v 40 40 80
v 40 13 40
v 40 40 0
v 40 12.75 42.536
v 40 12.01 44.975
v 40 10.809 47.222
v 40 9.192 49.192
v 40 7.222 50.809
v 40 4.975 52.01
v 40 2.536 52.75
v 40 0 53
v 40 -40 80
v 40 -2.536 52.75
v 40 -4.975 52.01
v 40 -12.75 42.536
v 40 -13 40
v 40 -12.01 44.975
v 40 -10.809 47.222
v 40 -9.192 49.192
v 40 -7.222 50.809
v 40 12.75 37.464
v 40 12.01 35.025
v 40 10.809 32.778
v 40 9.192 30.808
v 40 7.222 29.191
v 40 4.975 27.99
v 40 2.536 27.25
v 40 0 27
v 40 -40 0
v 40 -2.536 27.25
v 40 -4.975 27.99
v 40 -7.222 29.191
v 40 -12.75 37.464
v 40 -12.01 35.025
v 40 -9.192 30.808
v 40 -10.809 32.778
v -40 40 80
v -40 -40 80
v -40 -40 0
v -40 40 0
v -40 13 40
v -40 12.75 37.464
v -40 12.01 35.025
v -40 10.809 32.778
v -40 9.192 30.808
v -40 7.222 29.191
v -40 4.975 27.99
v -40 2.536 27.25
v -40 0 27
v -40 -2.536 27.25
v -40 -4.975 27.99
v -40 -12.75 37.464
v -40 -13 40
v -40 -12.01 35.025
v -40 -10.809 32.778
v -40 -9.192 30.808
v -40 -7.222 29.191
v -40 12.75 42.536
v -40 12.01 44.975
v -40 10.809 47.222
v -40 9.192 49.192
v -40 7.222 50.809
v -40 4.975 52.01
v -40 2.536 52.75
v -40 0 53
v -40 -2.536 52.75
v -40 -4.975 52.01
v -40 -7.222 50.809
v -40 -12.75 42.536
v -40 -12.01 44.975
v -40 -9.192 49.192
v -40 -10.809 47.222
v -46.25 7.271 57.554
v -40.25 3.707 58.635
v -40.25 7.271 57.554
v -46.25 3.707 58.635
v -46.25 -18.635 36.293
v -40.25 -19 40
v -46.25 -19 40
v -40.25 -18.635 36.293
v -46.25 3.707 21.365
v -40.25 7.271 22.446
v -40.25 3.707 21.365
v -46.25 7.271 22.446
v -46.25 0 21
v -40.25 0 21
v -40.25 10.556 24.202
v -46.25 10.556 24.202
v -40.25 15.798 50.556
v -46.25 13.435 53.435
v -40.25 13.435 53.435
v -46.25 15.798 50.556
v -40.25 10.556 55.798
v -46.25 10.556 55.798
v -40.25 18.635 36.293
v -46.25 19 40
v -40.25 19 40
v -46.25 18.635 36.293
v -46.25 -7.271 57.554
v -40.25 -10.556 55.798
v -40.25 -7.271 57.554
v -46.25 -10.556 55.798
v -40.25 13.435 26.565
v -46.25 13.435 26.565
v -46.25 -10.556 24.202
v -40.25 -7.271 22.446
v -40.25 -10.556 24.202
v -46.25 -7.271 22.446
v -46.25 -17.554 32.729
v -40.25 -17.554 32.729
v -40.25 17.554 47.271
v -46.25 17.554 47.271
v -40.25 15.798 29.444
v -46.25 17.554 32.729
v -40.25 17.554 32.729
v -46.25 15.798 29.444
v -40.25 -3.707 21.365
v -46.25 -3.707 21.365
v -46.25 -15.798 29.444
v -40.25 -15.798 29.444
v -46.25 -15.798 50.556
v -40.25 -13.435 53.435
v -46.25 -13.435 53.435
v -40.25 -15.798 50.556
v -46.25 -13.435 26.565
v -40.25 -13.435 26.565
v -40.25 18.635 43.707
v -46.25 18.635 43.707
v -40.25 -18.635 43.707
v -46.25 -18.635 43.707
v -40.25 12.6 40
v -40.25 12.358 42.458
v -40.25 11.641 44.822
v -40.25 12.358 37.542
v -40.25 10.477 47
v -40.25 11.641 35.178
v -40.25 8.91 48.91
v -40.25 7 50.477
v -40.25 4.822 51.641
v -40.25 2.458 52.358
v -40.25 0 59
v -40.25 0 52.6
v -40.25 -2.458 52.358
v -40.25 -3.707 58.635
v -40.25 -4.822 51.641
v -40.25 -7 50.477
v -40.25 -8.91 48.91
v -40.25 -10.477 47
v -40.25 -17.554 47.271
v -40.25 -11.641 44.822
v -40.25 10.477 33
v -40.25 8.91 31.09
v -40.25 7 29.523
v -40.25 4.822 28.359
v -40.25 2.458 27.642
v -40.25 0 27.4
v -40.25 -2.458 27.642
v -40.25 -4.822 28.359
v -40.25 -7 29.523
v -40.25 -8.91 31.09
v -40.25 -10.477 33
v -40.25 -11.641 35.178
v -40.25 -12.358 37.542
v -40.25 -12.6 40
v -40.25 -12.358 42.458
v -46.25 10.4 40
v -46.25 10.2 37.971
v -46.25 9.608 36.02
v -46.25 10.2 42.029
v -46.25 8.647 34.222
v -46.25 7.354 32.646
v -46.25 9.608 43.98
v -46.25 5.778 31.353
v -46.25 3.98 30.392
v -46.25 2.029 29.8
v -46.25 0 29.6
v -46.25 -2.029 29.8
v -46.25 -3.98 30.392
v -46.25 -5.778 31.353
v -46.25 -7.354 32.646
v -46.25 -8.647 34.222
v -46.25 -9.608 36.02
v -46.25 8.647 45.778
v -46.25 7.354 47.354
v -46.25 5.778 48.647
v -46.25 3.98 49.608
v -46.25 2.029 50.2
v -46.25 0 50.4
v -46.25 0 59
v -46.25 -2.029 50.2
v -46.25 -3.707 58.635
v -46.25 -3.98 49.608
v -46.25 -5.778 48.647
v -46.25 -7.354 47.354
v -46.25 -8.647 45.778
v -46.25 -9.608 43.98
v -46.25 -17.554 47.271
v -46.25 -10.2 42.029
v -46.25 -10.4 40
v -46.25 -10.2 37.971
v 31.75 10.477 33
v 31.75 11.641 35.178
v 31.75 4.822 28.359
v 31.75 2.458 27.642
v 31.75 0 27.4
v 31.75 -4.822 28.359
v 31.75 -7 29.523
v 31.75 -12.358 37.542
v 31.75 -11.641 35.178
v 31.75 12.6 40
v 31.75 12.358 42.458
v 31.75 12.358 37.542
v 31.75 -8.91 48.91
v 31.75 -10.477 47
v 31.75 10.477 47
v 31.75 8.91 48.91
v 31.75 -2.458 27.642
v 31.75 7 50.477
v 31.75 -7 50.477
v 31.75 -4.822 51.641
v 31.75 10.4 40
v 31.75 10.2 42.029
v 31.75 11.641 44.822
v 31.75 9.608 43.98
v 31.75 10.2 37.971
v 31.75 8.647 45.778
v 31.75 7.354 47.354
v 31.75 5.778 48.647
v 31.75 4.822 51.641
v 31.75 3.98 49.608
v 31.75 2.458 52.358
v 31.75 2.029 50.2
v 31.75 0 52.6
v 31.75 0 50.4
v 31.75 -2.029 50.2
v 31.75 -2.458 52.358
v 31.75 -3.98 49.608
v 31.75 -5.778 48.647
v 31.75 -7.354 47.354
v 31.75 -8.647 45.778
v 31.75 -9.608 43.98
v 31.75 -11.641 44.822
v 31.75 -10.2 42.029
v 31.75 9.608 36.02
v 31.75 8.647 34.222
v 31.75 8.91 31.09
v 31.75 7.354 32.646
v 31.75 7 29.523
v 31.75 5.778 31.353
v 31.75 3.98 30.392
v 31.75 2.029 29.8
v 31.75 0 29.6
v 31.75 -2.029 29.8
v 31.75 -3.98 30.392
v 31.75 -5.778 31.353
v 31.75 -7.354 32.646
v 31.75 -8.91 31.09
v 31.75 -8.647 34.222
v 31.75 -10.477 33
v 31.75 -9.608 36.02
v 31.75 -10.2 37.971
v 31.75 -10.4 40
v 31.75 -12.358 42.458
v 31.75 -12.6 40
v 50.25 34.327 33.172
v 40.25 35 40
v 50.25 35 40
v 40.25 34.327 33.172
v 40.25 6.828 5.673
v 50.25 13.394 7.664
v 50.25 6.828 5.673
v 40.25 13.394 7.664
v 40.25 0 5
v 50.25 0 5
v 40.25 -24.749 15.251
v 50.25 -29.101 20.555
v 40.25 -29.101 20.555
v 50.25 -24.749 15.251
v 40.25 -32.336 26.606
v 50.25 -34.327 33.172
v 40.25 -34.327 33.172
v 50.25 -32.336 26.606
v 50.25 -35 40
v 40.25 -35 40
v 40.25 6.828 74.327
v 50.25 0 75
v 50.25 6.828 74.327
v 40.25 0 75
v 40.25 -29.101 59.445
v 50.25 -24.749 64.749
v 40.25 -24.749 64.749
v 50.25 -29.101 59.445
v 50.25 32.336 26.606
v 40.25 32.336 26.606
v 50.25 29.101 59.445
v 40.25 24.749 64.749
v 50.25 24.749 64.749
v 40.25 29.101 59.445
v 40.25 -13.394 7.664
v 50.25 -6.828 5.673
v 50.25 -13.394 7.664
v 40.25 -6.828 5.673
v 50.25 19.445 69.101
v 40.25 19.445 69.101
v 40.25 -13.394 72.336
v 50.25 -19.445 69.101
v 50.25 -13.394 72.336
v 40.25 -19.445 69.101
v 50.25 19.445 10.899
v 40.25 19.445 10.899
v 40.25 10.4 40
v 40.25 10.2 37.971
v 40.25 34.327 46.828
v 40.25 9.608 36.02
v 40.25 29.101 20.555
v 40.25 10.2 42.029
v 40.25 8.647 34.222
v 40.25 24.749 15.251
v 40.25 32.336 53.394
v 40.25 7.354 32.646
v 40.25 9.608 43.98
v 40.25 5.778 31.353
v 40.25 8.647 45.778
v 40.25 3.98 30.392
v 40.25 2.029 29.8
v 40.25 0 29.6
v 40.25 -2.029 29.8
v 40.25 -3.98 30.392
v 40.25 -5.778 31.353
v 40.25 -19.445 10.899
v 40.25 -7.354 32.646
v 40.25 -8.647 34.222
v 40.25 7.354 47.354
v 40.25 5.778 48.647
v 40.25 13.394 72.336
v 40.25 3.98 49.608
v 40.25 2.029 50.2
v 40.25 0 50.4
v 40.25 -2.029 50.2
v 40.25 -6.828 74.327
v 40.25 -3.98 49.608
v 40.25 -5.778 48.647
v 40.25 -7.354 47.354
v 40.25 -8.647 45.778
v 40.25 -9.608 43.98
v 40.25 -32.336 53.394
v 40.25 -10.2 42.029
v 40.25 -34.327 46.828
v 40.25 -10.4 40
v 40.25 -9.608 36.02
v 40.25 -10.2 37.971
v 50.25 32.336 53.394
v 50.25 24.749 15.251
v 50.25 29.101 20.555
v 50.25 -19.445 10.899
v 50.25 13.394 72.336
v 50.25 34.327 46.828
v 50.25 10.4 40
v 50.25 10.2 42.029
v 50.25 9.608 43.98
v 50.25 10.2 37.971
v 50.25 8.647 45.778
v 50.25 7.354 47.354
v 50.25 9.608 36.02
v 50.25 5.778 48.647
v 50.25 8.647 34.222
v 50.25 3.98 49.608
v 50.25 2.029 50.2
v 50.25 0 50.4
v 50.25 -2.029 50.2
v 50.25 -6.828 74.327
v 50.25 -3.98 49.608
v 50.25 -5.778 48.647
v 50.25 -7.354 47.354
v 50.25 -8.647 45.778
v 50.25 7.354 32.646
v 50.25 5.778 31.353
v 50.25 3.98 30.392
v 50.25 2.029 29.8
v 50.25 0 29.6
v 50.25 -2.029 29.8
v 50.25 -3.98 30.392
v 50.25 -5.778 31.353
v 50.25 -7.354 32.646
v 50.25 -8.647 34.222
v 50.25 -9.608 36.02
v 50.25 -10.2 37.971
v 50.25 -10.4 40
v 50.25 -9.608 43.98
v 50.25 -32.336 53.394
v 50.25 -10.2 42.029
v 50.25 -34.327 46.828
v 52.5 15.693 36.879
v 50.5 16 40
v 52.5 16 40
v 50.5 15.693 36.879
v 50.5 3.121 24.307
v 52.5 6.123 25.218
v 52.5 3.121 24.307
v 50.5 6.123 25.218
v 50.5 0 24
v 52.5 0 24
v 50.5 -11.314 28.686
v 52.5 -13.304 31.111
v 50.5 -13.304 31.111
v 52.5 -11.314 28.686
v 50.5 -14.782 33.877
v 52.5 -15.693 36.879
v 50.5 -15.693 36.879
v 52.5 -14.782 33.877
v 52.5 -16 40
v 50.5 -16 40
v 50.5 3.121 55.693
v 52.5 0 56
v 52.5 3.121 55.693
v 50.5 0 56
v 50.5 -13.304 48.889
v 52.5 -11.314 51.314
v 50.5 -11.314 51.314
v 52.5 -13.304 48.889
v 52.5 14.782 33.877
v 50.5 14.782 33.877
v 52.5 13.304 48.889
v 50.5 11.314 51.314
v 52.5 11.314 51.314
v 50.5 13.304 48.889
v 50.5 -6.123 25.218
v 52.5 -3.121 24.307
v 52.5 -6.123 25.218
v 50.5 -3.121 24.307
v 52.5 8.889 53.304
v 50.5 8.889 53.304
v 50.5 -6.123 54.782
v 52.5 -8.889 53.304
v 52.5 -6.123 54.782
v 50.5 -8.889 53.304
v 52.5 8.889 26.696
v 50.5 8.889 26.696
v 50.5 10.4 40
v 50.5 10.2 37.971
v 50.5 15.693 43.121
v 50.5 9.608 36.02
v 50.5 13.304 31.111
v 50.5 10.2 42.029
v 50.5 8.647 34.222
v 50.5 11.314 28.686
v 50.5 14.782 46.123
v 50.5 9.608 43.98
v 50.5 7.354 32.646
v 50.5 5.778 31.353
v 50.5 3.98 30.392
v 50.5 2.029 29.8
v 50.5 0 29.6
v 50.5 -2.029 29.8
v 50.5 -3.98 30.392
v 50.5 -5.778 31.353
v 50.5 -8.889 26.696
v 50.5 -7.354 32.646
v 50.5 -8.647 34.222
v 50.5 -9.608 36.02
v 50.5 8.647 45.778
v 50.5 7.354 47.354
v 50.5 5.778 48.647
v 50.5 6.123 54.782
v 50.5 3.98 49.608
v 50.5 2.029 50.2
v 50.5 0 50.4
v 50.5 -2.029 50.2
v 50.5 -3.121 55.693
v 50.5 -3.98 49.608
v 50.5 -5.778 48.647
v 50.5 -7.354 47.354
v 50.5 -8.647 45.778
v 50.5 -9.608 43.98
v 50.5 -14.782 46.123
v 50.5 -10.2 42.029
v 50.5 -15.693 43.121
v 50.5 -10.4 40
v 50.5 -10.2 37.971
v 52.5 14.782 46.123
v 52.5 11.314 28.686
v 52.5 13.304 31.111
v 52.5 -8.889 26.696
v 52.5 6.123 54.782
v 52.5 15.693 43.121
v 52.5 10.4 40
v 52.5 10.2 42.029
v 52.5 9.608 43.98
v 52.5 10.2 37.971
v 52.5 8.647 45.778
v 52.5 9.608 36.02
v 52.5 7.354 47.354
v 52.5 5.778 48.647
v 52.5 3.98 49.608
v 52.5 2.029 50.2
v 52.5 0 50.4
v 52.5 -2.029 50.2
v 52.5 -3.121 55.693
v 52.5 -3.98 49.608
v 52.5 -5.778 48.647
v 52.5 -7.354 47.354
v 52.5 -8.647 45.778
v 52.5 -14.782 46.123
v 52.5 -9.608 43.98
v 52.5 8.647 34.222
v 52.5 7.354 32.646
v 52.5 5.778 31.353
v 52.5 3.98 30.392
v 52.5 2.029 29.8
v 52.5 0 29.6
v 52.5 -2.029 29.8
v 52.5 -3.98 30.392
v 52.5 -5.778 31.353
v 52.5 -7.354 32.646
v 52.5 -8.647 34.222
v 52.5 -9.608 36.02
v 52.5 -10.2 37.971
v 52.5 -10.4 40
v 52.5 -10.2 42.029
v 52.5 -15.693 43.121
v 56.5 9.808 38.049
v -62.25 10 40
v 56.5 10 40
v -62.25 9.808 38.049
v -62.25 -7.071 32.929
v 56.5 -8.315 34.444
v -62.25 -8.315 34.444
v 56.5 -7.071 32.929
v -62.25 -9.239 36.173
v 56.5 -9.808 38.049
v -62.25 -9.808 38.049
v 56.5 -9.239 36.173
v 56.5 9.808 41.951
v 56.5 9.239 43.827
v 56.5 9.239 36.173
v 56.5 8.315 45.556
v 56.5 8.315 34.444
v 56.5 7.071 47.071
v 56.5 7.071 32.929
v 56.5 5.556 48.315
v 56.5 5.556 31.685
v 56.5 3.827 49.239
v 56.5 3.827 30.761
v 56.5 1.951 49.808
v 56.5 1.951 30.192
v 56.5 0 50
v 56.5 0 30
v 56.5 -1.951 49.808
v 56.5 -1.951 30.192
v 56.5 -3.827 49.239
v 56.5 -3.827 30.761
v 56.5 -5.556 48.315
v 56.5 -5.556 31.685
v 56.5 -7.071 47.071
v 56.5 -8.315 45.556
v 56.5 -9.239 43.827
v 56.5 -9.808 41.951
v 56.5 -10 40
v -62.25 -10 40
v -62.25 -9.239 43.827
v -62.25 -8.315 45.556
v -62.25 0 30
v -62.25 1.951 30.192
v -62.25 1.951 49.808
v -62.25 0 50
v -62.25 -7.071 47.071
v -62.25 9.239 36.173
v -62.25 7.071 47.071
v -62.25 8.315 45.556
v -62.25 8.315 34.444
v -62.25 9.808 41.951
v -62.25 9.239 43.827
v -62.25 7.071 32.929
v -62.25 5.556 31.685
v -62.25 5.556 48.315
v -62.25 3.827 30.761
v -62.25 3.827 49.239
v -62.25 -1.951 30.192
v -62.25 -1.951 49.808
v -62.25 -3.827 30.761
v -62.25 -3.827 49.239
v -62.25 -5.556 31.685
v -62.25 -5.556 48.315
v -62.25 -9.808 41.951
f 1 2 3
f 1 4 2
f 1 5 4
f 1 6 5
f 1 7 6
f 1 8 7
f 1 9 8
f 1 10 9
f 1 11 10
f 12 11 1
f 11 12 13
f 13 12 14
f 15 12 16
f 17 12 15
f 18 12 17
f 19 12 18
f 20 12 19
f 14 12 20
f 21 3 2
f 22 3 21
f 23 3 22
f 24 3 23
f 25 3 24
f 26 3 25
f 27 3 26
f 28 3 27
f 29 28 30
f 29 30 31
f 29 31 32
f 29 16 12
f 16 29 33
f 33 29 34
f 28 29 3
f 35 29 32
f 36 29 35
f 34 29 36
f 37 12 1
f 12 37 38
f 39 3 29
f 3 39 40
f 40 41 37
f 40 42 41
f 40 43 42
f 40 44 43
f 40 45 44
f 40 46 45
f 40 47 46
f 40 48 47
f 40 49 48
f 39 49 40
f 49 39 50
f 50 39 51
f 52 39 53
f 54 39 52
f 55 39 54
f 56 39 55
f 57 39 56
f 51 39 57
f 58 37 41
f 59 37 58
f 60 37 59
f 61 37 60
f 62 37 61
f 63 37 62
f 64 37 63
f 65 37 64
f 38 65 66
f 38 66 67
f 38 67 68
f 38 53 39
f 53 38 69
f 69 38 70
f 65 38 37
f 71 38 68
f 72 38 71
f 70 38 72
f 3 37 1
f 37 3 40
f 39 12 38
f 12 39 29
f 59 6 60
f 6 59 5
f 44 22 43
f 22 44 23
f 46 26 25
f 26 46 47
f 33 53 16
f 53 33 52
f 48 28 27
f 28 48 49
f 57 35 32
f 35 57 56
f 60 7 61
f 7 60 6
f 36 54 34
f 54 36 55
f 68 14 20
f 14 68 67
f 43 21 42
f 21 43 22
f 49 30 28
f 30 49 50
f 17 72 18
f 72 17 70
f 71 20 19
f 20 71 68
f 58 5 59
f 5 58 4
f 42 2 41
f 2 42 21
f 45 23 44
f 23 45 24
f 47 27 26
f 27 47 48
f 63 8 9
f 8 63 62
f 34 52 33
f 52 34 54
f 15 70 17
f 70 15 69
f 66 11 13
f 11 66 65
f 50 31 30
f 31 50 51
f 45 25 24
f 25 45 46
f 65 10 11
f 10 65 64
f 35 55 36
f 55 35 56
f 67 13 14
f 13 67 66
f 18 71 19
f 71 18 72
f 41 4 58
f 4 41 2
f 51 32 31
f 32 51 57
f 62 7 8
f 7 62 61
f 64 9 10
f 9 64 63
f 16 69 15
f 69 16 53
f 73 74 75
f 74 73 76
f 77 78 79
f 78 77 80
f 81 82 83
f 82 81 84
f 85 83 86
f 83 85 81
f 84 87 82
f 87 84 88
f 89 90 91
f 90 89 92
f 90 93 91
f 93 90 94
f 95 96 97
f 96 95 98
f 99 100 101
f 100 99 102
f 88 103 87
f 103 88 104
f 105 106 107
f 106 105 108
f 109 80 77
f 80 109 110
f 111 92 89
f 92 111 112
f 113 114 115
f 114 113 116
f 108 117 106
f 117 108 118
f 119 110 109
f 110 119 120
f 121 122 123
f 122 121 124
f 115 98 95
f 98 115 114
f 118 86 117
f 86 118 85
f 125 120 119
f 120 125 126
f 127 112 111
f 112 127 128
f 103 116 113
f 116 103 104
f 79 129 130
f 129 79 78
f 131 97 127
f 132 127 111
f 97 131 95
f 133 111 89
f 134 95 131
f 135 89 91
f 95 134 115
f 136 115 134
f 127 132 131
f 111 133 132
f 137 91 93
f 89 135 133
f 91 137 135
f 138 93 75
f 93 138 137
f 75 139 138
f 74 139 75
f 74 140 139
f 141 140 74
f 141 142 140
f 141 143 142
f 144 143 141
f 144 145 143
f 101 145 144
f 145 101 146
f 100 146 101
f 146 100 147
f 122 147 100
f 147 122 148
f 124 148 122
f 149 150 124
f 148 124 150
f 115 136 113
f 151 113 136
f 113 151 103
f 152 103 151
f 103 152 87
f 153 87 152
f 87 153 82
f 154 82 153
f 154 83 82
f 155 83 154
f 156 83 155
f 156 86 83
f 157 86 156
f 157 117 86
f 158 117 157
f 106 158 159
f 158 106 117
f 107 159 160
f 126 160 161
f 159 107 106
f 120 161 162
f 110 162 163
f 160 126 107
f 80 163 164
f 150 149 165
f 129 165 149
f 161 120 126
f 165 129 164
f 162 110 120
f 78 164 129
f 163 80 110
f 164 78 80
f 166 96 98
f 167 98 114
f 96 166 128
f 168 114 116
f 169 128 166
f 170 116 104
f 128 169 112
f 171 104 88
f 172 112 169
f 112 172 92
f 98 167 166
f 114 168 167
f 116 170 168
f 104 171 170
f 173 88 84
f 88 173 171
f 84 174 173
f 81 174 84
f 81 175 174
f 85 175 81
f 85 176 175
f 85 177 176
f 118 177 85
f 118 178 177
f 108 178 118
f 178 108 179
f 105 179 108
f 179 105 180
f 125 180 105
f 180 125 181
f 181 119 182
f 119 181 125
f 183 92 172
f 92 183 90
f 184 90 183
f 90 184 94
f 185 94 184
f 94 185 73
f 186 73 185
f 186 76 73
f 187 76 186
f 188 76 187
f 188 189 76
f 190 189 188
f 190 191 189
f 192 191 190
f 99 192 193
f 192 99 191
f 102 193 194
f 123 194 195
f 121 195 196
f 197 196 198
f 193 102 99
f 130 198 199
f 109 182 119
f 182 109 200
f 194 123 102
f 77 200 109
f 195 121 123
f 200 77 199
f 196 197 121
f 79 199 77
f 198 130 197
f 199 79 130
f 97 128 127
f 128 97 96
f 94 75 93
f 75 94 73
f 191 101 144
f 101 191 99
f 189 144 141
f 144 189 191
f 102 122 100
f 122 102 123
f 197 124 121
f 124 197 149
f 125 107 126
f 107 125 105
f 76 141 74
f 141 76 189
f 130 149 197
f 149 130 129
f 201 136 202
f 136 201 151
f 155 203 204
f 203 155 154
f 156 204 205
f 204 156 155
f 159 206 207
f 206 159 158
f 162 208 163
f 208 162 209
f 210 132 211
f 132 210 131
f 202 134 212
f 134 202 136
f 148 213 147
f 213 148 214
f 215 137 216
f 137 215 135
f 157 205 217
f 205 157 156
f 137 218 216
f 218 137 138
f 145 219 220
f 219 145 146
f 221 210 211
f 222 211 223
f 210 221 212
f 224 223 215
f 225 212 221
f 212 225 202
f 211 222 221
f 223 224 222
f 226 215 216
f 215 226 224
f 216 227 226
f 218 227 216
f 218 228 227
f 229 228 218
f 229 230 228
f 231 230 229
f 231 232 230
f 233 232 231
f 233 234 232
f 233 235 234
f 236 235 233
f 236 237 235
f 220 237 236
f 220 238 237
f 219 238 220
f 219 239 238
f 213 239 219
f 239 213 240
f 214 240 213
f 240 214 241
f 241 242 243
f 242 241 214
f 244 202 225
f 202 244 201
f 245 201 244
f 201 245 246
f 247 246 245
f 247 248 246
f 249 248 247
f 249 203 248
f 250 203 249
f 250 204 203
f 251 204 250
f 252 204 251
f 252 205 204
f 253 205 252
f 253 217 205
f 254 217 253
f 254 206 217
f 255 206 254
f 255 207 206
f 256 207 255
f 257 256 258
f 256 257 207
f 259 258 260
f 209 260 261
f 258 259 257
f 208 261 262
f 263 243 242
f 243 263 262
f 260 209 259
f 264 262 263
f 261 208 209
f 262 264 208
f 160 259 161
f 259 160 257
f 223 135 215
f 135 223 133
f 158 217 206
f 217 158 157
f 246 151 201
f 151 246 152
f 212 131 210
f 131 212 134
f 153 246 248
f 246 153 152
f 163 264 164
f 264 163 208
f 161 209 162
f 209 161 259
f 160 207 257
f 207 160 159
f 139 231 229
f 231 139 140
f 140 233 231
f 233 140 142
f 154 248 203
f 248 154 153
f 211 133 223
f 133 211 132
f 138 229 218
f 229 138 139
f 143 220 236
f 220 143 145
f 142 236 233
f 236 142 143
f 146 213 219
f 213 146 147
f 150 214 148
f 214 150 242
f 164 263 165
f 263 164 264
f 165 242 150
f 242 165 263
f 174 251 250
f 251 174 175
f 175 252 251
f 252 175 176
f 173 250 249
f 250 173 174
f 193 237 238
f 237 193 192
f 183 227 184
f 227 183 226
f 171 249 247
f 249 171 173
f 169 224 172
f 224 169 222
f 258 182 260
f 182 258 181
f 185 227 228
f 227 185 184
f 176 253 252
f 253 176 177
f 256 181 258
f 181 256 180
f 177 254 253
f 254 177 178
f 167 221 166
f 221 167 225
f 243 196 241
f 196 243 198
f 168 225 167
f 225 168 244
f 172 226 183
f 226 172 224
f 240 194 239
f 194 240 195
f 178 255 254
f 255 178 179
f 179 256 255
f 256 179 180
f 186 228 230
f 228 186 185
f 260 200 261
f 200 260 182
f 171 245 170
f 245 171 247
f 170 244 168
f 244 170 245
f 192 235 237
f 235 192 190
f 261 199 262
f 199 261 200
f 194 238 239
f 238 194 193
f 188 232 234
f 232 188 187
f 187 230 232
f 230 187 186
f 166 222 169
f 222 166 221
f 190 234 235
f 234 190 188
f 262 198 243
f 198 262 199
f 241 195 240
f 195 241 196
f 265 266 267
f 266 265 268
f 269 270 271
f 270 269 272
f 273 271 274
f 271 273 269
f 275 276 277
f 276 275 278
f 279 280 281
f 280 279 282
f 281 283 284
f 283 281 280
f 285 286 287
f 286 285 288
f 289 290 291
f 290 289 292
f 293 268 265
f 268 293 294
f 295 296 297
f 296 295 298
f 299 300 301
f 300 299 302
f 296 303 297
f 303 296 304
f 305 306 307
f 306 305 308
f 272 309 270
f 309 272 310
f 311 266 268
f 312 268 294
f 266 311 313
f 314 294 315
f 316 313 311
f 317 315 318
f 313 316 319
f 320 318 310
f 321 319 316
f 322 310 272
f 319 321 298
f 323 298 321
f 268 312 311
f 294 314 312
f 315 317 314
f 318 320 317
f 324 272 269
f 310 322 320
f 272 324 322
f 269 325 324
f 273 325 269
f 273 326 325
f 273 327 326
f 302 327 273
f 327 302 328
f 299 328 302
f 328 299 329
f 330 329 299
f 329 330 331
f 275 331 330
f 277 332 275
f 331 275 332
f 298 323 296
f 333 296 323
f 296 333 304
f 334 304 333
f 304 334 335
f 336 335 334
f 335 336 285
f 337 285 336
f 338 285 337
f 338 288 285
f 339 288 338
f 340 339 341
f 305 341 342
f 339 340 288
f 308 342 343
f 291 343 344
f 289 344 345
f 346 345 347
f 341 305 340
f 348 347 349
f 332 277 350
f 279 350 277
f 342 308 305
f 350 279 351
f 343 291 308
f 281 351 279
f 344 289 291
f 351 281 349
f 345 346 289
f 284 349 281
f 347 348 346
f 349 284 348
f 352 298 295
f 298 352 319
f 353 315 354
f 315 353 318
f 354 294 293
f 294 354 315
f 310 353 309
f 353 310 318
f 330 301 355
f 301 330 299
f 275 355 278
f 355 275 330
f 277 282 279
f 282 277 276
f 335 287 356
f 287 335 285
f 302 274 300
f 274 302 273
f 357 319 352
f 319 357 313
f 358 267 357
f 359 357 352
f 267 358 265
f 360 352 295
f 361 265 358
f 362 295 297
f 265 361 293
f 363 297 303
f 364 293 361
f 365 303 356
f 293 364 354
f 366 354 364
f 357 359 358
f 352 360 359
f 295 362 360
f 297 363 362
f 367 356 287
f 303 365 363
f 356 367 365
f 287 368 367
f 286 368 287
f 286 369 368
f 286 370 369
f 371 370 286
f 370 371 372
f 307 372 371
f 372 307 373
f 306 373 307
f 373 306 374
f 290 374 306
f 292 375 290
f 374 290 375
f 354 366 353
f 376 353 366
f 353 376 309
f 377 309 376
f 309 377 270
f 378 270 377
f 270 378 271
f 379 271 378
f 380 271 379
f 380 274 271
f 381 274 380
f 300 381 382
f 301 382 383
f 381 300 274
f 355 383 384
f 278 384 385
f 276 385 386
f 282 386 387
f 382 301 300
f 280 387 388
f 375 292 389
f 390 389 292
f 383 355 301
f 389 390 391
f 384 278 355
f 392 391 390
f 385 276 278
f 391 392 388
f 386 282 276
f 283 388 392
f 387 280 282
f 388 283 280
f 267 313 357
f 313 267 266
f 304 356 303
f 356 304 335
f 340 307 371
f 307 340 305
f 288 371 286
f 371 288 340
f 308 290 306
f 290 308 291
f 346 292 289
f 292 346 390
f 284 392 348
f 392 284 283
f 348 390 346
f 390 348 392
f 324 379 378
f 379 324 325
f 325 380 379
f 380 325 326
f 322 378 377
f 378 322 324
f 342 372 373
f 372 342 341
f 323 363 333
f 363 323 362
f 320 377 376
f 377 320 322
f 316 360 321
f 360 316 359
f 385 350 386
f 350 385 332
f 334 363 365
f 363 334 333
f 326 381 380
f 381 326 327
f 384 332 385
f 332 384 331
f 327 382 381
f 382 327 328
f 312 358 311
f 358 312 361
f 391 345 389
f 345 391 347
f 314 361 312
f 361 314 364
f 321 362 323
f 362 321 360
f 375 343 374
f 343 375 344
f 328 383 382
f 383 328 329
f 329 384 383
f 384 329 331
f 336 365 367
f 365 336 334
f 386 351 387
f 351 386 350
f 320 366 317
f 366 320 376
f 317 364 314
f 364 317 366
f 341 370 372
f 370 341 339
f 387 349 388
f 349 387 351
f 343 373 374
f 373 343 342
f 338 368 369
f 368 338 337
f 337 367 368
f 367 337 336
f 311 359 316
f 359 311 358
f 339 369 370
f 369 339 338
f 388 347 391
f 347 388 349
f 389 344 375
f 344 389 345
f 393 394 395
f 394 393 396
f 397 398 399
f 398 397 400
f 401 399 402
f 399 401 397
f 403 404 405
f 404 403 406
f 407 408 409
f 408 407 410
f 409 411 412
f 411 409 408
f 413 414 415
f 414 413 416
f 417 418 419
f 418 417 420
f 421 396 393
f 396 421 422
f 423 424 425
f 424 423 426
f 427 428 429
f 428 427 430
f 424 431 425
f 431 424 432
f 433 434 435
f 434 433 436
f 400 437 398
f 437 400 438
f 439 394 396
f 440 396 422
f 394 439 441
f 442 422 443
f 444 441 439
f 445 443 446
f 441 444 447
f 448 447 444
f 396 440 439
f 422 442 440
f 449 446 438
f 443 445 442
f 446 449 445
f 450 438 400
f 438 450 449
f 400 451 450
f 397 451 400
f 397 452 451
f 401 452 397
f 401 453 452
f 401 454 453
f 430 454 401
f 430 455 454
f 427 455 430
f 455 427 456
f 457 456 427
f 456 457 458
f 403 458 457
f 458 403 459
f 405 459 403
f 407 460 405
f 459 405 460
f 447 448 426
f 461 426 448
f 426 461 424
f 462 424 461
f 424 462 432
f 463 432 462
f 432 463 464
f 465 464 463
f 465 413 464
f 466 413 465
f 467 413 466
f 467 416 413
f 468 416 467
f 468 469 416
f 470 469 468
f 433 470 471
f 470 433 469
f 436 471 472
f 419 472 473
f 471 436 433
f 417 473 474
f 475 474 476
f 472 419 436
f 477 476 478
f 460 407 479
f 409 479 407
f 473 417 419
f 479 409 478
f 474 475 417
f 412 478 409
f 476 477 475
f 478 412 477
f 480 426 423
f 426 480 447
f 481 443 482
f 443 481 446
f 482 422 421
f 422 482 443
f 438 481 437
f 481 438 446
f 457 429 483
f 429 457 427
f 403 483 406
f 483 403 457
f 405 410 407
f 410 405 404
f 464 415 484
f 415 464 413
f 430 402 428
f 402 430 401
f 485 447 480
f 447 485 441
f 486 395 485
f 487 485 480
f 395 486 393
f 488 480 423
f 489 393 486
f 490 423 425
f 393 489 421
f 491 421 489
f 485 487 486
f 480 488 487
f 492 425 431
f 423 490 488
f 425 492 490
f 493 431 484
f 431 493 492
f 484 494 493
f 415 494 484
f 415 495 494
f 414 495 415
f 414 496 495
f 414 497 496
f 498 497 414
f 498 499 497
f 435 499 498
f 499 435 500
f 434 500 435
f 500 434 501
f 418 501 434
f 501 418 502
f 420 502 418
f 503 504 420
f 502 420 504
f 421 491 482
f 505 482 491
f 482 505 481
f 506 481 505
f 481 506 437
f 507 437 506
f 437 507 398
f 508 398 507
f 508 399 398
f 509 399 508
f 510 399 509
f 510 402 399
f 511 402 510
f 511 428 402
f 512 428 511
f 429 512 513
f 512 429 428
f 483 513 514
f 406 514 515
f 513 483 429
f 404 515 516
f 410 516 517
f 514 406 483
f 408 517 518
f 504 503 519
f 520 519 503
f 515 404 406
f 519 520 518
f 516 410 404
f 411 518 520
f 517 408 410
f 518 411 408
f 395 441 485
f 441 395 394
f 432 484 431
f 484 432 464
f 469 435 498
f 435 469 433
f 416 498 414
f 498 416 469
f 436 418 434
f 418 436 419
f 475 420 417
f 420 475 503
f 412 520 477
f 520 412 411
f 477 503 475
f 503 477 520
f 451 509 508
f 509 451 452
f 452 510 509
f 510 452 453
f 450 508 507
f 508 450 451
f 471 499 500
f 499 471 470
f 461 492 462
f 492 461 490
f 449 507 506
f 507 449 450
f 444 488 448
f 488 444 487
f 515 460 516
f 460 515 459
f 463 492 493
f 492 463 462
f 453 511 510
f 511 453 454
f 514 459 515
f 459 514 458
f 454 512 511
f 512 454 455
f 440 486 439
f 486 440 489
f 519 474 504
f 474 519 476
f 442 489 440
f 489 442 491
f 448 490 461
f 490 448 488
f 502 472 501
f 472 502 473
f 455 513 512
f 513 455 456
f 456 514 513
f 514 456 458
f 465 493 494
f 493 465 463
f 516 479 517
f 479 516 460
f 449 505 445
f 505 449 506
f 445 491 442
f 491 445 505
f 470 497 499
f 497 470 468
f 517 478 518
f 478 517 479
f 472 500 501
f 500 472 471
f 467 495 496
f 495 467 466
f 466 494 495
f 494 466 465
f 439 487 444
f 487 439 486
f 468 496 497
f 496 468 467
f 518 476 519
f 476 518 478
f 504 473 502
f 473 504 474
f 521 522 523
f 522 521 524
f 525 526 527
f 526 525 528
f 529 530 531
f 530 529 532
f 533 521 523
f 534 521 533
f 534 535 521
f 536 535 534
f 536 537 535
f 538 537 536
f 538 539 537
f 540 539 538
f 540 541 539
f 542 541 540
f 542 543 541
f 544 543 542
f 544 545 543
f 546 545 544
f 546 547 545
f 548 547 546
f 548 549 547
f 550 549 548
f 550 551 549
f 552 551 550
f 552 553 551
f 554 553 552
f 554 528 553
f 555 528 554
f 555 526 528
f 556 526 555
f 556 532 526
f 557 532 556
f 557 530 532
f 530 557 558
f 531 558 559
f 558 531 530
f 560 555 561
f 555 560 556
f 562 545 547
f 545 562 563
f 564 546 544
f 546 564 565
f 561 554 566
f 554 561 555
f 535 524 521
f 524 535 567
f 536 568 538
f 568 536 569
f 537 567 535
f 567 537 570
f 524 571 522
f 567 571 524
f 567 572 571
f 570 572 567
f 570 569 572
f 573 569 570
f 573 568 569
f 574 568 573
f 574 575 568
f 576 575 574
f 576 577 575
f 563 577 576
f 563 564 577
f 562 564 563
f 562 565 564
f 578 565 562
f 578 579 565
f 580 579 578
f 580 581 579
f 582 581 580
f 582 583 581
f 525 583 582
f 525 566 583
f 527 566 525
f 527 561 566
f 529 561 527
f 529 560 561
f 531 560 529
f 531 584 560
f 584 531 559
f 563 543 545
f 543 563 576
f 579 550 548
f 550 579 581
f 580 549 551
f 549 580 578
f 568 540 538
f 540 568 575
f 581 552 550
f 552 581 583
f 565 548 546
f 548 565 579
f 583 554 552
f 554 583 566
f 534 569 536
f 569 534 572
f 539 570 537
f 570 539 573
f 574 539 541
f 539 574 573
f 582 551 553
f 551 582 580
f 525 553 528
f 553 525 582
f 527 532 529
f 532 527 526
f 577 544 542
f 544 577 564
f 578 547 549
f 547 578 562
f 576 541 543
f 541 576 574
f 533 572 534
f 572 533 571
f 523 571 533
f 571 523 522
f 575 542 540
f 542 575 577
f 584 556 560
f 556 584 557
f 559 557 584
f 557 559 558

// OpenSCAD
$fn = 32;

// ------------------------------------------------------------------------
// Bushed housing: 80 x 80 x 80 mm housing, bushing d25.2
// Every part is its own module, assembly() places them once.
// ------------------------------------------------------------------------

// --- part 1 ---
module housing() {
  difference() {
    translate([-40, -40, 0]) cube([80, 80, 80]);
    translate([0, 0, 40]) rotate([0, 90, 0]) cylinder(h = 82, d = 26, center = true);
  }
}

// --- part 2 ---
module bushing() {
  difference() {
    union() {
      cylinder(h = 6, d = 38);
      translate([0, 0, 6]) cylinder(h = 72, d = 25.2);
    }
    translate([0, 0, -1]) cylinder(h = 80, d = 20.8);
  }
}

// --- part 3 ---
module shaft() {
  translate([0, 0, -59.375]) cylinder(h = 118.75, d = 20);
}

// --- part 4 ---
module cover() {
  difference() {
    cylinder(h = 10, d = 70);
    translate([0, 0, -1]) cylinder(h = 12, d = 20.8);
  }
}

// --- part 5 ---
module washer() {
  difference() {
      translate([0, 0, 0]) cylinder(h = 2, d = 32);
      translate([0, 0, -1]) cylinder(h = 4, d = 20.8);
    }
}

// --- assembly ---
module assembly() {
  translate([0, 0, 0]) rotate([0, 0, 0]) housing();
  translate([-46.25, 0, 40]) rotate([0, 90, 0]) bushing();
  translate([-2.875, 0, 40]) rotate([0, 90, 0]) shaft();
  translate([40.25, 0, 40]) rotate([0, 90, 0]) cover();
  translate([50.5, 0, 40]) rotate([0, 90, 0]) washer();
}

assembly();
